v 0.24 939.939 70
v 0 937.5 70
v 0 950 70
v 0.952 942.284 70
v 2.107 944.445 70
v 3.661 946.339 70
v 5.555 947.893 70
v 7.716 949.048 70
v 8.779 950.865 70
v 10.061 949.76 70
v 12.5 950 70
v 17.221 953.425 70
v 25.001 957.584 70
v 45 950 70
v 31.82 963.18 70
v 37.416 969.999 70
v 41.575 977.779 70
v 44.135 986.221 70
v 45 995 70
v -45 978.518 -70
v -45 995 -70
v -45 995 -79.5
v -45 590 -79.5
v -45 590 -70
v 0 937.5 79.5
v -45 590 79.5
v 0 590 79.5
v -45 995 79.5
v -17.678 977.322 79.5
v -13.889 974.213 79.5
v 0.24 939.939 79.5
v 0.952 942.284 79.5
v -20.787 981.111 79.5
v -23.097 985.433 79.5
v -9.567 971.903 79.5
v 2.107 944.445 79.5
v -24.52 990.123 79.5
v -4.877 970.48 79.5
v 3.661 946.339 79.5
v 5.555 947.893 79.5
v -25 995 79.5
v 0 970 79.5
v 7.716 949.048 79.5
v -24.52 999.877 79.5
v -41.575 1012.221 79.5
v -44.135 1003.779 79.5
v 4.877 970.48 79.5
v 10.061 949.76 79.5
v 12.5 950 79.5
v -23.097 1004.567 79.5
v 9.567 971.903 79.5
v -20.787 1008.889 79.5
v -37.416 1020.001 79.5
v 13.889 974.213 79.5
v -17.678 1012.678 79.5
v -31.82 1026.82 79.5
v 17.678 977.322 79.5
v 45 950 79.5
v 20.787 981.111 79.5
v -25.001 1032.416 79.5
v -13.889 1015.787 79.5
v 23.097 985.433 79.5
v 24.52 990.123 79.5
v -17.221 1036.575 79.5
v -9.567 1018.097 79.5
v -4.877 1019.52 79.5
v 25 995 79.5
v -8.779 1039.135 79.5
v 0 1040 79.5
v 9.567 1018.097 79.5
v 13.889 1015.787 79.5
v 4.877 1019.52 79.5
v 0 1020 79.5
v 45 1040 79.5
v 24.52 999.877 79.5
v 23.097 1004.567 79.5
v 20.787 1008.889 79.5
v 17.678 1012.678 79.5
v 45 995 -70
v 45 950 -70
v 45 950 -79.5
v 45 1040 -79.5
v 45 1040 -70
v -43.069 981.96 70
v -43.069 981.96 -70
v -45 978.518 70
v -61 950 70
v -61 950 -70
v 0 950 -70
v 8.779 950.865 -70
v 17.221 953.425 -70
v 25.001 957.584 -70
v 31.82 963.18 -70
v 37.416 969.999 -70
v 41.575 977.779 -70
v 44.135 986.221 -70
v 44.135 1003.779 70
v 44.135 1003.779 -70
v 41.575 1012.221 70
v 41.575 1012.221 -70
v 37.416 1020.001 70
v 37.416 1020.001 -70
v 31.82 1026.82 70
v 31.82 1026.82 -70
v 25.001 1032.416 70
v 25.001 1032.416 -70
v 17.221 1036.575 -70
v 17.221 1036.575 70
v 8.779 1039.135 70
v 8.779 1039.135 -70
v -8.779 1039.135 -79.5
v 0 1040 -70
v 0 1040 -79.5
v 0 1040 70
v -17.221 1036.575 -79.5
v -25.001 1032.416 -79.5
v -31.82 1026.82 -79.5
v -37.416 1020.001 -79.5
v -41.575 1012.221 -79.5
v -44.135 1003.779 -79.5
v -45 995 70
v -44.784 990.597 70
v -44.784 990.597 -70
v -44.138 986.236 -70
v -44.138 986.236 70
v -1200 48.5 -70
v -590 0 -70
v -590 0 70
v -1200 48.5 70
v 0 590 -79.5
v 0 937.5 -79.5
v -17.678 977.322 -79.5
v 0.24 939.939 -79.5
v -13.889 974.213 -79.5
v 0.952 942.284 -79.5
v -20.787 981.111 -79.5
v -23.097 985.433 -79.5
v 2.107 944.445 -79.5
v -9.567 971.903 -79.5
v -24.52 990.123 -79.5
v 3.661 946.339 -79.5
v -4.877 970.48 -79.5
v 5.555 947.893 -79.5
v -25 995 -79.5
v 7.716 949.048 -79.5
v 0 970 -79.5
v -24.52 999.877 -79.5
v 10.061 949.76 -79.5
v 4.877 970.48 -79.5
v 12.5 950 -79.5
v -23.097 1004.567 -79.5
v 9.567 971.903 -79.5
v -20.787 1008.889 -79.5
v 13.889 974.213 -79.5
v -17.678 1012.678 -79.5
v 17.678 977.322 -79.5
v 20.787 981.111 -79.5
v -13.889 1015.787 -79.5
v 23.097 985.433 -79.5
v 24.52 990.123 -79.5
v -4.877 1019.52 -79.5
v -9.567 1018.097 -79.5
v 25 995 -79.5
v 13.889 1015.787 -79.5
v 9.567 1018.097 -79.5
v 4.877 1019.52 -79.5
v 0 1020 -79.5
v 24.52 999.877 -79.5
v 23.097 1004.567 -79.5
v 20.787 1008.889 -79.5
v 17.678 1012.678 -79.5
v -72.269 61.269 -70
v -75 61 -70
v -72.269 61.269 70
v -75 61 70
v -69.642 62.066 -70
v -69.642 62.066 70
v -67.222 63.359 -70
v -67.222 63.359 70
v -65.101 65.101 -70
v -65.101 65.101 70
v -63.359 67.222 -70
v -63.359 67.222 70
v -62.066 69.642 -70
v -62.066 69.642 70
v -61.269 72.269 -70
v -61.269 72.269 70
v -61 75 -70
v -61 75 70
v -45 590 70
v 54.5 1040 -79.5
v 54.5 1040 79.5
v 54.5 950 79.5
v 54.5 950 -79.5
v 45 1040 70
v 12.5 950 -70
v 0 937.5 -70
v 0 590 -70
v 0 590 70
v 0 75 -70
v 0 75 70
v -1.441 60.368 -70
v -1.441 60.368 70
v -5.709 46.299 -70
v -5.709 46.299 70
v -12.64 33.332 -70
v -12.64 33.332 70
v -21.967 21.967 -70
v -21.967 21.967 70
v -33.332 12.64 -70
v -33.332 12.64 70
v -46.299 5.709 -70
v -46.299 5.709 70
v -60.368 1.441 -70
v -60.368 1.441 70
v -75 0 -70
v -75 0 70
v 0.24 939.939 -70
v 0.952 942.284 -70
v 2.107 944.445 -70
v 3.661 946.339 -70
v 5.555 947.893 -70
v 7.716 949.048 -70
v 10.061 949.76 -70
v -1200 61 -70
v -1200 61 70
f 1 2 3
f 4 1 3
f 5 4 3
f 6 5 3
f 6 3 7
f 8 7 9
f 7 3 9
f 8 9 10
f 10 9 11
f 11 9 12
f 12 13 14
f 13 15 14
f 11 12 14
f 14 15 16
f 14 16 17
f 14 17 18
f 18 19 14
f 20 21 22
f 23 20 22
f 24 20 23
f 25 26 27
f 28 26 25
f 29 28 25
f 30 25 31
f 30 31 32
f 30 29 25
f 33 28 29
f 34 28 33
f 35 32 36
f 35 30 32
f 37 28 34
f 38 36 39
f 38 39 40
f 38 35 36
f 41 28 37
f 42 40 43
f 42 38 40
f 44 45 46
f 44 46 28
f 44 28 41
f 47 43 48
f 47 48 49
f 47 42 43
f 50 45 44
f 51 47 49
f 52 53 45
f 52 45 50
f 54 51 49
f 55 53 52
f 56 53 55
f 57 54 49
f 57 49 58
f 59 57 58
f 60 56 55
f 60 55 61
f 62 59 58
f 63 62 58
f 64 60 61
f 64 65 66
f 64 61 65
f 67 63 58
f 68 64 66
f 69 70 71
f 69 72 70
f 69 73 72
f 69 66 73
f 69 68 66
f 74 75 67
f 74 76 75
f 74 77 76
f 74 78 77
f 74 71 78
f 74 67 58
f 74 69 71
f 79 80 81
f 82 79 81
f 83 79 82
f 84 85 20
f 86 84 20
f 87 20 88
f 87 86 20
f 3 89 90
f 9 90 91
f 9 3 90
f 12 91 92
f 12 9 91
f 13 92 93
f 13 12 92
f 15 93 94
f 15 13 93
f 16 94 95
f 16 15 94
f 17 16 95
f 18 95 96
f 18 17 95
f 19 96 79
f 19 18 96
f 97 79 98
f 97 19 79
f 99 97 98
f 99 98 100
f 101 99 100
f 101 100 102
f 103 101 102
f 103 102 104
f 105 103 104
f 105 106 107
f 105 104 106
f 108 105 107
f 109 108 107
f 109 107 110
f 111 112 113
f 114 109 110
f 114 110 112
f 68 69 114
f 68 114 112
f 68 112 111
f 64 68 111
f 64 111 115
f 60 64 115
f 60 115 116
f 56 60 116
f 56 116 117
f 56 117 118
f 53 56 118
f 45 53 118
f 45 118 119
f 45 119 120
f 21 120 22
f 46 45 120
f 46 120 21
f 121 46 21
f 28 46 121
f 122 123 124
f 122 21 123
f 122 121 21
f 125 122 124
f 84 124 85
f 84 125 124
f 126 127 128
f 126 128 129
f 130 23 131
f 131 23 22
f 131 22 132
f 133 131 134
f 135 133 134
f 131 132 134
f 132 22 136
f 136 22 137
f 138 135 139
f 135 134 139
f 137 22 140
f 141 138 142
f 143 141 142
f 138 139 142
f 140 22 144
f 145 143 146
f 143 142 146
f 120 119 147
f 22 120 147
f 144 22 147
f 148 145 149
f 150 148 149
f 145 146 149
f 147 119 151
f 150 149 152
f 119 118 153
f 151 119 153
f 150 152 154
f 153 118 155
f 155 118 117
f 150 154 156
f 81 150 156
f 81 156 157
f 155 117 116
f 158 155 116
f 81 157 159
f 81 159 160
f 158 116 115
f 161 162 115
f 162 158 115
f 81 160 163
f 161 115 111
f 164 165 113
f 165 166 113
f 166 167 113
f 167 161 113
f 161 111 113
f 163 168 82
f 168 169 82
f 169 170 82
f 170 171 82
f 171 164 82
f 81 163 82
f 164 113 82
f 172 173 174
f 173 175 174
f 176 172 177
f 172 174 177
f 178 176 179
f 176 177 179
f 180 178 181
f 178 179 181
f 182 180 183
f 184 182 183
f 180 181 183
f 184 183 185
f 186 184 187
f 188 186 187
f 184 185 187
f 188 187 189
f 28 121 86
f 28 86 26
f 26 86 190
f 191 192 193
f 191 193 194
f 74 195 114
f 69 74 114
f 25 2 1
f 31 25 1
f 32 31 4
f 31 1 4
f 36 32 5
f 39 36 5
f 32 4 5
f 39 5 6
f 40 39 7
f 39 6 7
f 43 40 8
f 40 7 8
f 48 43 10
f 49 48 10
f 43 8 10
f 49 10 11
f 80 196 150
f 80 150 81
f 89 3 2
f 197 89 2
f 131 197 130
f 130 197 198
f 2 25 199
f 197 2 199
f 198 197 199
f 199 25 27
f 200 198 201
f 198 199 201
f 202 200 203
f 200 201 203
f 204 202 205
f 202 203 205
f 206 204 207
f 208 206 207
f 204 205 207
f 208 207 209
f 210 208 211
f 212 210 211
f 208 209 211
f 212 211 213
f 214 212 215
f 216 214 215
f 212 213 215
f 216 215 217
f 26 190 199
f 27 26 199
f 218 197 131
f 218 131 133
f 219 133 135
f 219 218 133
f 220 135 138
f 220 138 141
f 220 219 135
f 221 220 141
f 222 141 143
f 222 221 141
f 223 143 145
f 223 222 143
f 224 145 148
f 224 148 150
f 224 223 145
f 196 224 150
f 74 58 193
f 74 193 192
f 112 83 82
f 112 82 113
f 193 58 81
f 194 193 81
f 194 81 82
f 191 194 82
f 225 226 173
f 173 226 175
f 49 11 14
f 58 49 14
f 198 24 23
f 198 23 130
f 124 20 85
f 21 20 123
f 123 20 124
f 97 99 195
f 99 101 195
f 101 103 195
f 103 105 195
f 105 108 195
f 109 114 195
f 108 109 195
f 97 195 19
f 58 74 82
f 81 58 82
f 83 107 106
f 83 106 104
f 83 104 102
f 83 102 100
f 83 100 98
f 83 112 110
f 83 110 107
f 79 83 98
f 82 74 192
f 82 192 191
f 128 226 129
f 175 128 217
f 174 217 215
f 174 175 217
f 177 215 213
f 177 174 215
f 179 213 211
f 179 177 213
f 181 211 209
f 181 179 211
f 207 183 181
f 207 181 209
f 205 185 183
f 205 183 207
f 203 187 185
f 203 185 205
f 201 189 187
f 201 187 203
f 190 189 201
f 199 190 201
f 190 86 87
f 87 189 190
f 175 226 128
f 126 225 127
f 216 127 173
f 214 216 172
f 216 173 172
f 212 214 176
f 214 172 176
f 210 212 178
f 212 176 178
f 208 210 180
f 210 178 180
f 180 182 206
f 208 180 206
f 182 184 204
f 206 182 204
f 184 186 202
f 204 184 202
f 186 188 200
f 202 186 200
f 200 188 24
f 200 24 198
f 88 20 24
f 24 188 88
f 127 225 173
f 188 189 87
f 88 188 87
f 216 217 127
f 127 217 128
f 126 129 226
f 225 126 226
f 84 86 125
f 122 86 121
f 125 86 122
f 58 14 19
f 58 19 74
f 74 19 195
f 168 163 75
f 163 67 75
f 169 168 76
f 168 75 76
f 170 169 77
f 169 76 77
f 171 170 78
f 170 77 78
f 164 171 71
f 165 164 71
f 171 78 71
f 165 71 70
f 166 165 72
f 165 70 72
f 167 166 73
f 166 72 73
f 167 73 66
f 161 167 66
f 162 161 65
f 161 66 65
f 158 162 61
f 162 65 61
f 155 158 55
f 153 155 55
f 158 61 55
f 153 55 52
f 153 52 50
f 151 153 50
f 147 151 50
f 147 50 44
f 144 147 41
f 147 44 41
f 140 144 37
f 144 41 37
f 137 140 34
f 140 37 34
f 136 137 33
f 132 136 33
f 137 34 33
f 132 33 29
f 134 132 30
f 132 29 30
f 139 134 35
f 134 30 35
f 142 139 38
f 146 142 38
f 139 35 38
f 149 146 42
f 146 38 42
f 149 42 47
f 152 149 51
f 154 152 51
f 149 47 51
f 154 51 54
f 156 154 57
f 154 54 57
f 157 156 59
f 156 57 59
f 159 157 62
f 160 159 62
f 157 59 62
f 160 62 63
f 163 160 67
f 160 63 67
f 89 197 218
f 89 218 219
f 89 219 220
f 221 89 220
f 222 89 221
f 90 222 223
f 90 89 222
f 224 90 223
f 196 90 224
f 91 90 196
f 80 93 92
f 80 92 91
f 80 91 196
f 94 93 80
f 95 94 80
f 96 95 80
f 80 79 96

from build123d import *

# Parameters (mm, degrees)
EXTRUDE_THIN1_DEPTH     = 70
CUT_EXTRUDE1_DEPTH      = 1537.912489376
CUT_EXTRUDE1_DEPTH_BACK = 1537.912489376
SKETCH3_R               = 45
SKETCH3_R_2             = 25
BOSS_EXTRUDE1_DEPTH     = 70
BOSS_EXTRUDE2_DEPTH     = 70
SKETCH5_R               = 45
SKETCH5_R_2             = 25
BOSS_EXTRUDE3_DEPTH     = 9.5
SKETCH6_W               = 159
SKETCH6_H               = 90
BOSS_EXTRUDE4_DEPTH     = 9.5


with BuildPart() as part:
    # Sketch1 → Extrude-Thin1 (new, symmetric)
    with BuildSketch(Plane.XY):
        with BuildLine():
            Line((0, 950), (0, 75))
            ThreePointArc((0, 75), (-21.966991411, 21.966991411), (-75, 0))
            Line((-75, 0), (-1200, 0))
            Line((-1200, 0), (-1200, 61))
            Line((-1200, 61), (-75, 61))
            ThreePointArc((-75, 61), (-65.100505063, 65.100505063), (-61, 75))
            Line((-61, 75), (-61, 950))
            Line((-61, 950), (0, 950))
        make_face()
    extrude(amount=EXTRUDE_THIN1_DEPTH, both=True)

    # Sketch2 → Cut-Extrude1 (cut, two sides: drawn at the far end of the back side and taken through both)
    with BuildSketch(Plane.XY.offset(70).offset(-CUT_EXTRUDE1_DEPTH_BACK)):
        Polygon((-4202.326226889, 287.209544269), (-1200, 48.5), (-590, 0), (2412.326226889, -238.709544269), (1934.907138351, -6243.361998046), (-4679.745315427, -5717.442909508), align=None)
    extrude(amount=CUT_EXTRUDE1_DEPTH + CUT_EXTRUDE1_DEPTH_BACK, mode=Mode.SUBTRACT)



with BuildPart() as body_2:
    # Sketch3 → Boss-Extrude1 (new, symmetric)
    with BuildSketch(Plane.XY):
        with Locations((0, 995)):
            Circle(SKETCH3_R)
        with Locations((0, 995)):
            Circle(SKETCH3_R_2, mode=Mode.SUBTRACT)
    extrude(amount=BOSS_EXTRUDE1_DEPTH, both=True)


with BuildPart() as body_3:
    # Sketch4 → Boss-Extrude2 (new, symmetric)
    with BuildSketch(Plane.XY):
        with BuildLine():
            Line((-61, 950), (0, 950))
            ThreePointArc((0, 950), (-26.815976936, 958.862714809), (-43.069182498, 981.959849736))
            Line((-43.069182498, 981.959849736), (-61, 950))
        make_face()
    extrude(amount=BOSS_EXTRUDE2_DEPTH, both=True)


with BuildPart() as part_1:
    add(part.part)

    add(body_2.part)  # Boss-Extrude3 merges body 2

    add(body_3.part)  # Boss-Extrude3 merges body 3
    # Sketch5 → Boss-Extrude3 (add)
    # profile 1 of 3: a face of its own
    with BuildSketch(Plane.XY.offset(70)):
        with BuildLine():
            Line((45, 1040), (0, 1040))
            ThreePointArc((0, 1040), (31.819805153, 1026.819805153), (45, 995))
            Line((45, 995), (45, 1040))
        make_face()
    # profile 2 of 3: a face of its own
    with BuildSketch(Plane.XY.offset(70)):
        with Locations((0, 995)):
            Circle(SKETCH5_R)
        with Locations((0, 995)):
            Circle(SKETCH5_R_2, mode=Mode.SUBTRACT)
    # profile 3 of 3: a face of its own
    with BuildSketch(Plane.XY.offset(70)):
        with BuildLine():
            ThreePointArc((45, 995), (0, 950), (-45, 995))
            Line((-45, 995), (-45, 590))
            Line((-45, 590), (0, 590))
            Line((0, 590), (0, 937.5))
            ThreePointArc((0, 937.5), (3.661165235, 946.338834765), (12.5, 950))
            Line((12.5, 950), (45, 950))
            Line((45, 950), (45, 995))
        make_face()
    boss_extrude3 = extrude(amount=BOSS_EXTRUDE3_DEPTH)

    # Mirror1: Boss-Extrude3 across plane
    add(boss_extrude3.mirror(Plane.XY))


with BuildPart() as body_2_2:
    # Sketch6 → Boss-Extrude4 (new body)
    with BuildSketch(Plane(origin=(45, 0, 0), x_dir=(0, 0, -1), z_dir=(1, 0, 0))):
        with Locations((0, 995)):
            Rectangle(SKETCH6_W, SKETCH6_H)
    extrude(amount=BOSS_EXTRUDE4_DEPTH)


solid = Compound([part_1.part, body_2_2.part])
